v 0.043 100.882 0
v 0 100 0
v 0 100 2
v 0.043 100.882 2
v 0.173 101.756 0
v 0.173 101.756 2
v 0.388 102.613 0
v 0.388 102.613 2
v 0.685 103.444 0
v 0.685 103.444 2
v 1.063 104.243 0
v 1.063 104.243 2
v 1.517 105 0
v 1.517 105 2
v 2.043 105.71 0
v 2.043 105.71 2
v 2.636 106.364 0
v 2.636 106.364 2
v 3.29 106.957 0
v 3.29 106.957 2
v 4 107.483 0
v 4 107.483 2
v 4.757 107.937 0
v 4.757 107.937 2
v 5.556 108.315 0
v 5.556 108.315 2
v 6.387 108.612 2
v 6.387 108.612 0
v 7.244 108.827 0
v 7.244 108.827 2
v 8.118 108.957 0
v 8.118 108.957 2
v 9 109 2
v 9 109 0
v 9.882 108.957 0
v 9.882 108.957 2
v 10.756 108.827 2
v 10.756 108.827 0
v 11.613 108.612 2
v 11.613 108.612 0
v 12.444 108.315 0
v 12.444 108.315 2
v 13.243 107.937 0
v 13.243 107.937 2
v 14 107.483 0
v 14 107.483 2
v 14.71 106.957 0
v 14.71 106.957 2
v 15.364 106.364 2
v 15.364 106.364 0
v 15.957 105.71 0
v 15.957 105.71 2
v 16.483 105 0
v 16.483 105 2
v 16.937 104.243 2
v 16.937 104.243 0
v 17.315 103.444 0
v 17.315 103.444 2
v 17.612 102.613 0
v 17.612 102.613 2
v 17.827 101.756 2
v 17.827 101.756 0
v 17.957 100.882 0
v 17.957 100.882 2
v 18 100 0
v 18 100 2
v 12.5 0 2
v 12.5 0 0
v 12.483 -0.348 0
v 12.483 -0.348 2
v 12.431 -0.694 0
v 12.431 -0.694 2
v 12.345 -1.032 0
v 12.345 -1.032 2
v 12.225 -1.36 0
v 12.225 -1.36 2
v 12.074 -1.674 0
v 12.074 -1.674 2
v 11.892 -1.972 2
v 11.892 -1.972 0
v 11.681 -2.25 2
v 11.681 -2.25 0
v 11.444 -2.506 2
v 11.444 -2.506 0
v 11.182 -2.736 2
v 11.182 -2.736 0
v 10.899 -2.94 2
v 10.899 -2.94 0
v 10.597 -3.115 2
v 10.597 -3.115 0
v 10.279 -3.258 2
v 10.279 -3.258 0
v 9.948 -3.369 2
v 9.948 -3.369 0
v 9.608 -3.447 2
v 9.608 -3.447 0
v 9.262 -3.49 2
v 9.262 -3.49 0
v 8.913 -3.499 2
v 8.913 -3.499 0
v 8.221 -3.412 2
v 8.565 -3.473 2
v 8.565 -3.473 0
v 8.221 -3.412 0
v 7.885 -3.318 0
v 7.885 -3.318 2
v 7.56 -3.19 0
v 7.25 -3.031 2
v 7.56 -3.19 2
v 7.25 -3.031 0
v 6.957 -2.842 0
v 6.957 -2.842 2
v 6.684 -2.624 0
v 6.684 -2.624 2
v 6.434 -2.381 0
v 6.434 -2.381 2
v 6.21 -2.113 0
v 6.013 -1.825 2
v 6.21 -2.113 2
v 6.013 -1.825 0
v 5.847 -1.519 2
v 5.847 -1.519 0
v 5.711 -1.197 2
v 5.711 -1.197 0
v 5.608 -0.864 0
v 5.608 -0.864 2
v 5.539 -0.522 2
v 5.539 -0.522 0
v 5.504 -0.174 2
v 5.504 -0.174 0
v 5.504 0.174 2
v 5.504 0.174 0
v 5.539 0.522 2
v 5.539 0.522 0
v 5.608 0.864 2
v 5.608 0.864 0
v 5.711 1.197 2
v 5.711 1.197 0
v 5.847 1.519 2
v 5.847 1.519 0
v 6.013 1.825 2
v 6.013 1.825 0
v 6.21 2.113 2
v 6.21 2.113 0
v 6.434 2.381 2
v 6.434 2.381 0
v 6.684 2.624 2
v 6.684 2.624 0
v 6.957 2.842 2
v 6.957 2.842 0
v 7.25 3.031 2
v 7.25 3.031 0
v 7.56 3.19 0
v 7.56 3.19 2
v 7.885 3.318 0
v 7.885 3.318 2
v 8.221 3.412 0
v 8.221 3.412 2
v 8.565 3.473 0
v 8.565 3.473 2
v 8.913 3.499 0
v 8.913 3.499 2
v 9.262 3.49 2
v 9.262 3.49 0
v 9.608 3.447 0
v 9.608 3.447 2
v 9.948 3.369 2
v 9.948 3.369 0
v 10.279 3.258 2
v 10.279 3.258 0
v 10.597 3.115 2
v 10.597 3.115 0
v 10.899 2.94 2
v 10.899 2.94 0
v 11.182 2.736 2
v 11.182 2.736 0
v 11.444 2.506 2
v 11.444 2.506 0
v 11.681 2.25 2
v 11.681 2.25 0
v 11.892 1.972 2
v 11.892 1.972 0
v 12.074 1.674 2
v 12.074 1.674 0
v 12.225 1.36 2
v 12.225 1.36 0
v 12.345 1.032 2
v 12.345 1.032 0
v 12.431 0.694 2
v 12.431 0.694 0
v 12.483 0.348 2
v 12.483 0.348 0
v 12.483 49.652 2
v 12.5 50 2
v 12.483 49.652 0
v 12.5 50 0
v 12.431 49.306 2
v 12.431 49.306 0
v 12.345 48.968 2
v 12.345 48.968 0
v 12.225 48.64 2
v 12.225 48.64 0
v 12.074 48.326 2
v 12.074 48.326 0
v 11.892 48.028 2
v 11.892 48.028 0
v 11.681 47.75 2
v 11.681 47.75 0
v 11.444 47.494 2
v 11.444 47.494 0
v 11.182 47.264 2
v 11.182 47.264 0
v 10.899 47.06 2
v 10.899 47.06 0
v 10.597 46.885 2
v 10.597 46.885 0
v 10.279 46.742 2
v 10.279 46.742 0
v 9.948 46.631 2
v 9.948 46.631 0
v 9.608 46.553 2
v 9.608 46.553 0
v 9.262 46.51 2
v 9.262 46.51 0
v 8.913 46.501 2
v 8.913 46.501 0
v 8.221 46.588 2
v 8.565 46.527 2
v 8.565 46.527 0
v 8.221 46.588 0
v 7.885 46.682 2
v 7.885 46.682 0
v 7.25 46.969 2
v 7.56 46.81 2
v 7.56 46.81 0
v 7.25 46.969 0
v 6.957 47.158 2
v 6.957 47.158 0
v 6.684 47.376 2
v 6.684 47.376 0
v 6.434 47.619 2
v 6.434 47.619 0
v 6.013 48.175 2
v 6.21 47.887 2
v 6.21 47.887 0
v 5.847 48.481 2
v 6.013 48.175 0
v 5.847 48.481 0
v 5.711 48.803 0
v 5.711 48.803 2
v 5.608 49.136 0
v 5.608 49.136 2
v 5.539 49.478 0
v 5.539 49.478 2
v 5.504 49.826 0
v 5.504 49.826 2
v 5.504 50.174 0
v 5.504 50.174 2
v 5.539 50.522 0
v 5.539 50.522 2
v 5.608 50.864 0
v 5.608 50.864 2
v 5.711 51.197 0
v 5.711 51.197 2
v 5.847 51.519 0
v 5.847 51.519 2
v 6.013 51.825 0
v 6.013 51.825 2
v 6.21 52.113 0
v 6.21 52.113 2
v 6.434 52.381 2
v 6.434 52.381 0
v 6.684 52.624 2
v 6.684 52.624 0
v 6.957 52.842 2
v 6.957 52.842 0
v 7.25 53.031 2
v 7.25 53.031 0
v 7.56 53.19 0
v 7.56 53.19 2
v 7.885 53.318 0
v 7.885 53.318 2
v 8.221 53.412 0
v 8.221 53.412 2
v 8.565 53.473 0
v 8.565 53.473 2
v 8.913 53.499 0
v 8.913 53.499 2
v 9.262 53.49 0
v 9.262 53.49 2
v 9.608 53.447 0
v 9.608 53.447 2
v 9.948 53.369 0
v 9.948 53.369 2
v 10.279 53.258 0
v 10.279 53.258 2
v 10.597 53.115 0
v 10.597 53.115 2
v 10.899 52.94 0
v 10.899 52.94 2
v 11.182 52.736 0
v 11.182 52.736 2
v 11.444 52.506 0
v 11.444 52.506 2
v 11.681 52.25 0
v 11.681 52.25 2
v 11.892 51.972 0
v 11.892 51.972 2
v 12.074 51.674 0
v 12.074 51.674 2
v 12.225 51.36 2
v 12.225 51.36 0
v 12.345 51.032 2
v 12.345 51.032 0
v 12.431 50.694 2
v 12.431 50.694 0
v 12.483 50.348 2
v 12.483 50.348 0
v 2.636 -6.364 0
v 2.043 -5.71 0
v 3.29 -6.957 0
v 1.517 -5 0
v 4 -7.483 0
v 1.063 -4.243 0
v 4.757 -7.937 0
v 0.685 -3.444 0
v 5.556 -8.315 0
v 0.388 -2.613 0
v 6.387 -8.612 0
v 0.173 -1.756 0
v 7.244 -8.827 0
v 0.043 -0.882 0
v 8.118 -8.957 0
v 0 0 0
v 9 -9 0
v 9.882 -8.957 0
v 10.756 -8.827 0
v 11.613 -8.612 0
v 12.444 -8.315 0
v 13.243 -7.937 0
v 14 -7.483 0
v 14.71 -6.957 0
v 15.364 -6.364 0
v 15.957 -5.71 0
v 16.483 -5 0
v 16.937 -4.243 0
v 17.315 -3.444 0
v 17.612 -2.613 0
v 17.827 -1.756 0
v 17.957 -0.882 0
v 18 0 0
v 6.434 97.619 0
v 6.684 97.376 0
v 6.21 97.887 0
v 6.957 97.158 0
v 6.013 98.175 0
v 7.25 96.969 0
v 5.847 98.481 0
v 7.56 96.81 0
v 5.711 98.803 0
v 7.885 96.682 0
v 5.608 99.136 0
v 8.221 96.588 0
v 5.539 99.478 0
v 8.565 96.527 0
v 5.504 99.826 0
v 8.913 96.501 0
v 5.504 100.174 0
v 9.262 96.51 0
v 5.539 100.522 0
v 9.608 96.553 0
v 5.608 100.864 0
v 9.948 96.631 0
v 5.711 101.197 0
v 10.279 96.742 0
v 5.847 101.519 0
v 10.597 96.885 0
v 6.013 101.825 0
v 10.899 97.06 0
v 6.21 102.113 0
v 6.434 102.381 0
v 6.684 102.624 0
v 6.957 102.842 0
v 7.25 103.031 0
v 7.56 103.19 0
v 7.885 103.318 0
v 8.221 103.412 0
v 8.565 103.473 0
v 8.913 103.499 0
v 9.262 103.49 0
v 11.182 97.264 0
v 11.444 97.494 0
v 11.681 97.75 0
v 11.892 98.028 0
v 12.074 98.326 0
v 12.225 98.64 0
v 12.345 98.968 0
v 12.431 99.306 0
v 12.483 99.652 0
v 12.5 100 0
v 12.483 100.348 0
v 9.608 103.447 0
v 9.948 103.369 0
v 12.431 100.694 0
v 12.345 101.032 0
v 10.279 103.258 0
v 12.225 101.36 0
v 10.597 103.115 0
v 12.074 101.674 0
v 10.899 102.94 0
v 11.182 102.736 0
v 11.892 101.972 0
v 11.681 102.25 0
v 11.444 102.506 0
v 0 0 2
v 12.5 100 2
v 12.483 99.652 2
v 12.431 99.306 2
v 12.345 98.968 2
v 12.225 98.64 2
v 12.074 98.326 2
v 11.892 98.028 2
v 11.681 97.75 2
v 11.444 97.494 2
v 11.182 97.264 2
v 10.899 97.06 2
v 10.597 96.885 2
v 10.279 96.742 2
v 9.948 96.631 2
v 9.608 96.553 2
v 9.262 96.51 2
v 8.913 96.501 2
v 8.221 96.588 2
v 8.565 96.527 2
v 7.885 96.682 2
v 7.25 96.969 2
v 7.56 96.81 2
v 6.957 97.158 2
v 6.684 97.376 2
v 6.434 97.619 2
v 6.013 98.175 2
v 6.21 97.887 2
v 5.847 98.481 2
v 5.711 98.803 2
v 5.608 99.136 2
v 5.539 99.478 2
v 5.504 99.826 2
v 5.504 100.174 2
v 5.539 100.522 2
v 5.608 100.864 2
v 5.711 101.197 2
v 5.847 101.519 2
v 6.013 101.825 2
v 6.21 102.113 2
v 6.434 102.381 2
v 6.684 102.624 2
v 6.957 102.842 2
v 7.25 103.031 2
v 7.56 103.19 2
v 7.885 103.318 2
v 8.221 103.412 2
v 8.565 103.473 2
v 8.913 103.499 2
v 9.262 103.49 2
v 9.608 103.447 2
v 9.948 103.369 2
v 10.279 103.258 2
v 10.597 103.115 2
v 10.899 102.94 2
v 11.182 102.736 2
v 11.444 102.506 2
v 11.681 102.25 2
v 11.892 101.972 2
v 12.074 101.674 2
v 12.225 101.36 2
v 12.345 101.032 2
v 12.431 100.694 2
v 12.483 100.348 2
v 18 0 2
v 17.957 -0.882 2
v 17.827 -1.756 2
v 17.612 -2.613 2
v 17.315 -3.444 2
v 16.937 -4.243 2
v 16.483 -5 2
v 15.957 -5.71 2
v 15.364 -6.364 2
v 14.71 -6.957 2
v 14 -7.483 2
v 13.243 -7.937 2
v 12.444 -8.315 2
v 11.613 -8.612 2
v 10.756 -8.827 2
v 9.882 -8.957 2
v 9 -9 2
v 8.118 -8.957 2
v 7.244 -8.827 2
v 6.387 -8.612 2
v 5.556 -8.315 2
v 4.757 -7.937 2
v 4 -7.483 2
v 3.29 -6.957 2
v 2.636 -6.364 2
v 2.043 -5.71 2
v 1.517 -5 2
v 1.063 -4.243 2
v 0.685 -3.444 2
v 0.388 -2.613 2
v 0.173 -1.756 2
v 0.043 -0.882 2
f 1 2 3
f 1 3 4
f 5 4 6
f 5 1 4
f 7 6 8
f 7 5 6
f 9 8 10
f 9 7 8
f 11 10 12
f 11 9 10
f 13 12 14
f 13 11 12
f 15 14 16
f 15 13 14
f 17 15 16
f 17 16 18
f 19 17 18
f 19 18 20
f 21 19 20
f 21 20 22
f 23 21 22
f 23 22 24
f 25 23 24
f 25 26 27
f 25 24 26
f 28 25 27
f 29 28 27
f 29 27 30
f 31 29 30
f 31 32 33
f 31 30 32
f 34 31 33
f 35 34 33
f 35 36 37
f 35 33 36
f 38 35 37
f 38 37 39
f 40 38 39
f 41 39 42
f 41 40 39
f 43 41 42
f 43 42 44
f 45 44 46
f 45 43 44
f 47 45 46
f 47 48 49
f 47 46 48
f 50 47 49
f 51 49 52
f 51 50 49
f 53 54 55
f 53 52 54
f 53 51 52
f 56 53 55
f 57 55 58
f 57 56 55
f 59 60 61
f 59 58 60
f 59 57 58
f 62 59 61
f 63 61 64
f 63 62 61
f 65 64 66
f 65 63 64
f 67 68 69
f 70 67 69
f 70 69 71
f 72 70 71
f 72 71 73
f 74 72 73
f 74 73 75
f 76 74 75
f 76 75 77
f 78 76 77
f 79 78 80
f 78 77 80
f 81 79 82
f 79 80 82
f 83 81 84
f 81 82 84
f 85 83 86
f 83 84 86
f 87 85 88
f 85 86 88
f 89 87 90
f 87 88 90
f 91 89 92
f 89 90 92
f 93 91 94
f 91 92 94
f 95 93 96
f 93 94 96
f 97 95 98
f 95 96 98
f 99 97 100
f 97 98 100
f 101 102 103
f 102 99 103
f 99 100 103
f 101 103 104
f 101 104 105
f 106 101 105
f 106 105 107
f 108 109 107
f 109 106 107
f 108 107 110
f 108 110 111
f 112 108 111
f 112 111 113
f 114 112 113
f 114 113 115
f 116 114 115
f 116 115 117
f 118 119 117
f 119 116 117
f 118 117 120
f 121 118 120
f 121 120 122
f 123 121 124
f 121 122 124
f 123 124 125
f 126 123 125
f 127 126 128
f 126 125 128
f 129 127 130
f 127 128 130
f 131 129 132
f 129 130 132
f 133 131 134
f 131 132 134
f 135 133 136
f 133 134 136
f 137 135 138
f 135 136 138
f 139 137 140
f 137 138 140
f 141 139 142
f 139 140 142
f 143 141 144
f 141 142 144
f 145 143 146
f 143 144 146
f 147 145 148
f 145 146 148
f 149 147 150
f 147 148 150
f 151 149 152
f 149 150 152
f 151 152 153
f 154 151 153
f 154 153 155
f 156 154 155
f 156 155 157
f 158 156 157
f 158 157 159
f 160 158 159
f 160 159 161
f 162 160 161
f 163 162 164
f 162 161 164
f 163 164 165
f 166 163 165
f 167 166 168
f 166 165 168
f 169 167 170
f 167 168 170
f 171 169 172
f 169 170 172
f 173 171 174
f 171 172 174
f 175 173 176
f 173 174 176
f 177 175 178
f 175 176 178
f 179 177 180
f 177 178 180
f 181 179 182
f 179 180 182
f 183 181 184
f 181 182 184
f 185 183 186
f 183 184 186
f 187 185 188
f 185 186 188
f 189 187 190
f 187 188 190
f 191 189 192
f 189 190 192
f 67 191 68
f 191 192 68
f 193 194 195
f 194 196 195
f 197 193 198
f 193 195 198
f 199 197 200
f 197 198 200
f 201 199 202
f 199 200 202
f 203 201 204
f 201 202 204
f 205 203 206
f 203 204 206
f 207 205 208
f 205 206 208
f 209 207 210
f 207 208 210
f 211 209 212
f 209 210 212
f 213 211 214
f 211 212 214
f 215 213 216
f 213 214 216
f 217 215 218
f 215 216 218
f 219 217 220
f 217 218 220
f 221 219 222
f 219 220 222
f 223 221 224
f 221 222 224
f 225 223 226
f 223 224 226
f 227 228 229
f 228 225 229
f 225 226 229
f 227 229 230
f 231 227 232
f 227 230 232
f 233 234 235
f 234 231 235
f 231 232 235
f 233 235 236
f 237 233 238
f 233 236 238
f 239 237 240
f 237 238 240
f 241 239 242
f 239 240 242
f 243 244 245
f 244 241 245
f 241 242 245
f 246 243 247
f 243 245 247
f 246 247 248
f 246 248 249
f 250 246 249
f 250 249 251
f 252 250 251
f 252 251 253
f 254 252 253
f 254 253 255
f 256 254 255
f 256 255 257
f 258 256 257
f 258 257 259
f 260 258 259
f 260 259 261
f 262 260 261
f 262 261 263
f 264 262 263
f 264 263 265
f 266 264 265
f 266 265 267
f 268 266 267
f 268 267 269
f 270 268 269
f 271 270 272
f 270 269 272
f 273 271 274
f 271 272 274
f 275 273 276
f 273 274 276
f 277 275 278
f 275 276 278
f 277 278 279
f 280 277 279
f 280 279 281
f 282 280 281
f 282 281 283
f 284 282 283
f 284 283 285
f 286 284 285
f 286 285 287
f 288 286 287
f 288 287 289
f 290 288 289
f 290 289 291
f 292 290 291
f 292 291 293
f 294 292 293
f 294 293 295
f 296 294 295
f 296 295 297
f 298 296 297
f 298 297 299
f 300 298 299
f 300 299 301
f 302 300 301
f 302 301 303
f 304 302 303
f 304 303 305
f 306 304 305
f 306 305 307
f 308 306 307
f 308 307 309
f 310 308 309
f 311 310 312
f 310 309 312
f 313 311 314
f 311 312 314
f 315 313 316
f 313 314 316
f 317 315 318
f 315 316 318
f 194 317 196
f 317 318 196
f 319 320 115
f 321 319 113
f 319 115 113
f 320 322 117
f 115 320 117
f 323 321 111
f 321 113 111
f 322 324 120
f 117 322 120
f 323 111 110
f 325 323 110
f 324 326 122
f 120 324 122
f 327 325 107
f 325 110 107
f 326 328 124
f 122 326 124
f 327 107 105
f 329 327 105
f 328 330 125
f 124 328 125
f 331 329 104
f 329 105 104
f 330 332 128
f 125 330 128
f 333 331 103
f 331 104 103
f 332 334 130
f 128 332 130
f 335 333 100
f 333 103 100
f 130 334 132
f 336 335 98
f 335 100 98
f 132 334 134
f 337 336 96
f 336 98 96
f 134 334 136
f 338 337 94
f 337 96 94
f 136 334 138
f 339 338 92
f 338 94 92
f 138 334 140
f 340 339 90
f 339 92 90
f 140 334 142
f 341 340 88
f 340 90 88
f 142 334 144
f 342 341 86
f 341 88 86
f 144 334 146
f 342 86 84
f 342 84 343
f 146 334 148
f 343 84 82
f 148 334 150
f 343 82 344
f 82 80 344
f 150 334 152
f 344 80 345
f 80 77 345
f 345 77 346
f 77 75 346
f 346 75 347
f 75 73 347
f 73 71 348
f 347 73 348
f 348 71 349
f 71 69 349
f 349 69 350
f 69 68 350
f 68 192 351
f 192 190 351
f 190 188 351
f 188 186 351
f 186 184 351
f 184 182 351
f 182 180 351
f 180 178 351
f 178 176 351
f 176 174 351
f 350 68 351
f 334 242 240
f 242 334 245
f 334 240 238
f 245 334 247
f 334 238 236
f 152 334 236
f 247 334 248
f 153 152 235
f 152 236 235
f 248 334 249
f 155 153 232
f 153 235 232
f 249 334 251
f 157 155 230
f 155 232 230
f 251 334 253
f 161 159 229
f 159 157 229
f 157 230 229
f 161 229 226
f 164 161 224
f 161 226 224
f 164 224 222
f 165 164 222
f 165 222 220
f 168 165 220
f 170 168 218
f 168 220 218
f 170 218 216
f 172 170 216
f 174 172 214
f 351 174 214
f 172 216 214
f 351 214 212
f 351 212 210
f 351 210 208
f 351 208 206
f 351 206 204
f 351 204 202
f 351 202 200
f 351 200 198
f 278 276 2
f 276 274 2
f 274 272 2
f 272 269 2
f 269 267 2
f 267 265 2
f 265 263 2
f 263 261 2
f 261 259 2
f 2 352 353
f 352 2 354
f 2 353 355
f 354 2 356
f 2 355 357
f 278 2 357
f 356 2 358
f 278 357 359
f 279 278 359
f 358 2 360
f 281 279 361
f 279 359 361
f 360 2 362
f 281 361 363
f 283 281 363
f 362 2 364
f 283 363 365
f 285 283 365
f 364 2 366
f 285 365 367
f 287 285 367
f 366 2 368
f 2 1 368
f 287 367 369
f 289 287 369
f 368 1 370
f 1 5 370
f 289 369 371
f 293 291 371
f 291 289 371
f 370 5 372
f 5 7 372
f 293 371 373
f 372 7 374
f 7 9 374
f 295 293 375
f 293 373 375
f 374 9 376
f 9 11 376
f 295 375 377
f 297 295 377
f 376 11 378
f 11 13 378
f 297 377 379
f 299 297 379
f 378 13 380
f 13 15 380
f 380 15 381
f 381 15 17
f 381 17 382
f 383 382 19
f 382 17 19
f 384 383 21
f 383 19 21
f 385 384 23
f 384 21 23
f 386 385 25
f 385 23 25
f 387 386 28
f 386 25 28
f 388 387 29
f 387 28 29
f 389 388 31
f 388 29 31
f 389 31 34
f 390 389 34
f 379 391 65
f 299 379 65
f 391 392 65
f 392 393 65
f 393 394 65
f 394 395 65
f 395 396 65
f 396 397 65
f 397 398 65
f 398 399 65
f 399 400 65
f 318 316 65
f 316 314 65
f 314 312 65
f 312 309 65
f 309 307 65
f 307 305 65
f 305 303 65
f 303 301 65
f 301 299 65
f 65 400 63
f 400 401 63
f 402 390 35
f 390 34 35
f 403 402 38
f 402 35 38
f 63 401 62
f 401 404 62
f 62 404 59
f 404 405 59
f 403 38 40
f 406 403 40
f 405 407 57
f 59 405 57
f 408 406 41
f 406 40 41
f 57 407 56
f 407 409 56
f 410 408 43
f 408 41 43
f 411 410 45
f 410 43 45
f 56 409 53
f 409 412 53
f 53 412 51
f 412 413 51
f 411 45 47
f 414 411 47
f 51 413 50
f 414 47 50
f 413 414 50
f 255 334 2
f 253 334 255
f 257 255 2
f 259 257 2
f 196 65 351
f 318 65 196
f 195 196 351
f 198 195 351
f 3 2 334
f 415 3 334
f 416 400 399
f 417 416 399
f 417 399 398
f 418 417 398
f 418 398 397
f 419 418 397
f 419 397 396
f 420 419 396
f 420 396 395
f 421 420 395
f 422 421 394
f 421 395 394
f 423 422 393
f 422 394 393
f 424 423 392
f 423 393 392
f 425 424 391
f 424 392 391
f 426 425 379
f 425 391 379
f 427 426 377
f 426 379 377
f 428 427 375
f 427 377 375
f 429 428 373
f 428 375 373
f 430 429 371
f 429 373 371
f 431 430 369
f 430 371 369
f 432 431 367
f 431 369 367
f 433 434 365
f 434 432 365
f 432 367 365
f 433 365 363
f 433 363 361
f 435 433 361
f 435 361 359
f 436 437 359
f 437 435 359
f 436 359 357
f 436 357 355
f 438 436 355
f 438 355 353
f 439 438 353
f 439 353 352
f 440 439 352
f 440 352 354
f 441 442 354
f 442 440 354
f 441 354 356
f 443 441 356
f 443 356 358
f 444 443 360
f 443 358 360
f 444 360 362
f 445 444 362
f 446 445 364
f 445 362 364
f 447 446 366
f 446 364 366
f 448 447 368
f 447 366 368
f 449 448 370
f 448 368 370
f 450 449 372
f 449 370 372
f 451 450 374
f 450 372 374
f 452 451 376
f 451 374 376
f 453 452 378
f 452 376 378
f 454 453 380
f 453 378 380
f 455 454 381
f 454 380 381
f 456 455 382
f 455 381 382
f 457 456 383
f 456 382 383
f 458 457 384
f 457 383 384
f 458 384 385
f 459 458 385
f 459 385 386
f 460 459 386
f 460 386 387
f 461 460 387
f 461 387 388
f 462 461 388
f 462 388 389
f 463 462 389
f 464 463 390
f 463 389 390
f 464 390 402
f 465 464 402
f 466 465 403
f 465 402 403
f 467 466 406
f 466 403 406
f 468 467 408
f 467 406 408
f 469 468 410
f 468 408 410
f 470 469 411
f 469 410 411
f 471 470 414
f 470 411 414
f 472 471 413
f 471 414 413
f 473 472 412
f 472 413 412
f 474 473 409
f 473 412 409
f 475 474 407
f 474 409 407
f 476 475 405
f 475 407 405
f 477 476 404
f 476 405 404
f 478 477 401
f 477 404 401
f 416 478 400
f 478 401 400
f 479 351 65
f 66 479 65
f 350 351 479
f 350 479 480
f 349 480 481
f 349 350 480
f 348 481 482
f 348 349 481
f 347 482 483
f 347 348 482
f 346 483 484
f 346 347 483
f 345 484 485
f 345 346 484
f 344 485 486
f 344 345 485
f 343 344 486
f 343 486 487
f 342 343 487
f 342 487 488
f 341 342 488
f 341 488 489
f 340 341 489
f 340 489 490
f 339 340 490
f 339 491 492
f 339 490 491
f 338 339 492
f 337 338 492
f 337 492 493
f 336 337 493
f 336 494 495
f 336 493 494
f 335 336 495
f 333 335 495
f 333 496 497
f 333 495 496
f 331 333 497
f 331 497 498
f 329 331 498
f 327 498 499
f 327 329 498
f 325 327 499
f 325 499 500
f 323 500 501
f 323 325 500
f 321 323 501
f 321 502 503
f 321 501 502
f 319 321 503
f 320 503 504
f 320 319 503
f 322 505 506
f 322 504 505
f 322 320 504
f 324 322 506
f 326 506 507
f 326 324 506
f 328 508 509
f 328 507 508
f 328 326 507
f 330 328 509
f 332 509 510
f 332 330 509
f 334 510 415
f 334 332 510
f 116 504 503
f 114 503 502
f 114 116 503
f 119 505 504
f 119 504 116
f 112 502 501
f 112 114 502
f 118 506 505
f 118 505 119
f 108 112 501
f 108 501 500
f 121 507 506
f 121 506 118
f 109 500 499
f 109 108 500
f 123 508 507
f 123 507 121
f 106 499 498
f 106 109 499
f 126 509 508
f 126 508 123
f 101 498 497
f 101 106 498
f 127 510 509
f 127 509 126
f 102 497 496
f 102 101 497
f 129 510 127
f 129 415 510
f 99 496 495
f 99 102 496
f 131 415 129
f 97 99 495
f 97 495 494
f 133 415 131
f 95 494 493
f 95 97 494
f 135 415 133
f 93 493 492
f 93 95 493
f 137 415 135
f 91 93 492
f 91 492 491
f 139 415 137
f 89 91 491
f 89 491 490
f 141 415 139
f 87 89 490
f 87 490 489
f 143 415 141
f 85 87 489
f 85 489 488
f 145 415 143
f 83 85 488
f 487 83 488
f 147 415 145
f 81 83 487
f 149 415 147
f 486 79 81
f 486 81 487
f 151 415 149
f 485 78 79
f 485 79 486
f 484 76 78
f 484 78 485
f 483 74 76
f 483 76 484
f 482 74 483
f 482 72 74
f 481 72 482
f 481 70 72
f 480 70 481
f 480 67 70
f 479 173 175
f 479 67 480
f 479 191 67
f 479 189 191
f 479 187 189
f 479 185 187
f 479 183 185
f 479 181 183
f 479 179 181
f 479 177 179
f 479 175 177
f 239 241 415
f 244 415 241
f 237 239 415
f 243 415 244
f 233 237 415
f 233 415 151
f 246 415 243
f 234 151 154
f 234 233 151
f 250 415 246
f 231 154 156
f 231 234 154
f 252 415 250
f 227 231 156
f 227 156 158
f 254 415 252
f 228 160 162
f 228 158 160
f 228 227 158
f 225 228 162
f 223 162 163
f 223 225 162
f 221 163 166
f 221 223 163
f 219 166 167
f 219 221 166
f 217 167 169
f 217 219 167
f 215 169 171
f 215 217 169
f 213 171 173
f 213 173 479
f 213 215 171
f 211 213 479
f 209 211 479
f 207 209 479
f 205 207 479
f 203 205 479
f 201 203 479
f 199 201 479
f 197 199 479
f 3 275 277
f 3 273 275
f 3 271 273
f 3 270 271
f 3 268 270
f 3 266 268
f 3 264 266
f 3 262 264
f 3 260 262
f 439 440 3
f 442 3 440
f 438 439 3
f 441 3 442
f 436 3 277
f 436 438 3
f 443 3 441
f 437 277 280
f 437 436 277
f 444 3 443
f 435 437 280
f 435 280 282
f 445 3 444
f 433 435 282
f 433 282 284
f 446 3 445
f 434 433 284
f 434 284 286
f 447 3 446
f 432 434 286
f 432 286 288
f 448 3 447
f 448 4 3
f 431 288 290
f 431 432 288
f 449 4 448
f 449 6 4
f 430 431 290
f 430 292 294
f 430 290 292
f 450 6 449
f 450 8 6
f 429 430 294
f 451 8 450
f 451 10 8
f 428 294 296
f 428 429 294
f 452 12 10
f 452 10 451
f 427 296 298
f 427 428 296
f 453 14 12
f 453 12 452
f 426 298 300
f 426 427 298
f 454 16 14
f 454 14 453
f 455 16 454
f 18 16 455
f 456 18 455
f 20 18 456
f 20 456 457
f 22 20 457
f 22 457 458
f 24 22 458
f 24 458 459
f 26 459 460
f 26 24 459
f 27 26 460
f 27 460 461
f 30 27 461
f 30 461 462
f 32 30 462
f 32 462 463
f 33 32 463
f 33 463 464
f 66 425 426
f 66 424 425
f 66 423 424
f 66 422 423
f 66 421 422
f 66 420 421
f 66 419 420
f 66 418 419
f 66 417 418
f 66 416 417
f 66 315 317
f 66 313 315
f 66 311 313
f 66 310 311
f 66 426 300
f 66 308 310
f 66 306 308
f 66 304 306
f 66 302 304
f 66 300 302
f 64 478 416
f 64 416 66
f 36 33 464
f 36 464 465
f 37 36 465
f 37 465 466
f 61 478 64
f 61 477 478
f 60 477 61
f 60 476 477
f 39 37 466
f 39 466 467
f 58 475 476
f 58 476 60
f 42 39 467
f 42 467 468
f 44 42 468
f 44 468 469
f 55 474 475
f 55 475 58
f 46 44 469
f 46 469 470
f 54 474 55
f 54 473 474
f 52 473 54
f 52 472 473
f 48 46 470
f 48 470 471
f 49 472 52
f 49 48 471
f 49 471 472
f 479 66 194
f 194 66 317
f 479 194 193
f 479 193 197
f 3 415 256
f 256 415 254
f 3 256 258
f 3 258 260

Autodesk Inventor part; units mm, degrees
ref_plane "YZ Plane" through (0, 0, 0) normal (1, 0, 0) x (0, 1, 0)
ref_plane "XZ Plane" through (0, 0, 0) normal (0, 1, 0) x (-1, 0, 0)
ref_plane "XY Plane" through (0, 0, 0) normal (0, 0, 1) x (1, 0, 0)
sketch "スケッチ1" plane through (0, 0, 0) normal (0, 0, 1) x (1, 0, 0)
  line L0 (18, 0) -> (18, 100)
  line L1 (0, 100) -> (0, 0)
  line L2 (9, 100) -> (9, 0) construction
  arc A0 (18, 100) -> (0, 100) centre (9, 100) ccw
  arc A1 (0, 0) -> (18, 0) centre (9, 0) ccw
  circle A2 centre (9, 0) radius 3.5
  circle A3 centre (9, 100) radius 3.5
  circle A4 centre (9, 50) radius 3.5
  dimension "d35" = 18
  dimension "d36" = 100
  dimension "d37" = 7
  dimension "d38" = 7
  dimension "d41" = 7
extrude "押し出し1" add sketch "スケッチ1" along normal blind 2
properties part number "hip_link" material "GFRP"
